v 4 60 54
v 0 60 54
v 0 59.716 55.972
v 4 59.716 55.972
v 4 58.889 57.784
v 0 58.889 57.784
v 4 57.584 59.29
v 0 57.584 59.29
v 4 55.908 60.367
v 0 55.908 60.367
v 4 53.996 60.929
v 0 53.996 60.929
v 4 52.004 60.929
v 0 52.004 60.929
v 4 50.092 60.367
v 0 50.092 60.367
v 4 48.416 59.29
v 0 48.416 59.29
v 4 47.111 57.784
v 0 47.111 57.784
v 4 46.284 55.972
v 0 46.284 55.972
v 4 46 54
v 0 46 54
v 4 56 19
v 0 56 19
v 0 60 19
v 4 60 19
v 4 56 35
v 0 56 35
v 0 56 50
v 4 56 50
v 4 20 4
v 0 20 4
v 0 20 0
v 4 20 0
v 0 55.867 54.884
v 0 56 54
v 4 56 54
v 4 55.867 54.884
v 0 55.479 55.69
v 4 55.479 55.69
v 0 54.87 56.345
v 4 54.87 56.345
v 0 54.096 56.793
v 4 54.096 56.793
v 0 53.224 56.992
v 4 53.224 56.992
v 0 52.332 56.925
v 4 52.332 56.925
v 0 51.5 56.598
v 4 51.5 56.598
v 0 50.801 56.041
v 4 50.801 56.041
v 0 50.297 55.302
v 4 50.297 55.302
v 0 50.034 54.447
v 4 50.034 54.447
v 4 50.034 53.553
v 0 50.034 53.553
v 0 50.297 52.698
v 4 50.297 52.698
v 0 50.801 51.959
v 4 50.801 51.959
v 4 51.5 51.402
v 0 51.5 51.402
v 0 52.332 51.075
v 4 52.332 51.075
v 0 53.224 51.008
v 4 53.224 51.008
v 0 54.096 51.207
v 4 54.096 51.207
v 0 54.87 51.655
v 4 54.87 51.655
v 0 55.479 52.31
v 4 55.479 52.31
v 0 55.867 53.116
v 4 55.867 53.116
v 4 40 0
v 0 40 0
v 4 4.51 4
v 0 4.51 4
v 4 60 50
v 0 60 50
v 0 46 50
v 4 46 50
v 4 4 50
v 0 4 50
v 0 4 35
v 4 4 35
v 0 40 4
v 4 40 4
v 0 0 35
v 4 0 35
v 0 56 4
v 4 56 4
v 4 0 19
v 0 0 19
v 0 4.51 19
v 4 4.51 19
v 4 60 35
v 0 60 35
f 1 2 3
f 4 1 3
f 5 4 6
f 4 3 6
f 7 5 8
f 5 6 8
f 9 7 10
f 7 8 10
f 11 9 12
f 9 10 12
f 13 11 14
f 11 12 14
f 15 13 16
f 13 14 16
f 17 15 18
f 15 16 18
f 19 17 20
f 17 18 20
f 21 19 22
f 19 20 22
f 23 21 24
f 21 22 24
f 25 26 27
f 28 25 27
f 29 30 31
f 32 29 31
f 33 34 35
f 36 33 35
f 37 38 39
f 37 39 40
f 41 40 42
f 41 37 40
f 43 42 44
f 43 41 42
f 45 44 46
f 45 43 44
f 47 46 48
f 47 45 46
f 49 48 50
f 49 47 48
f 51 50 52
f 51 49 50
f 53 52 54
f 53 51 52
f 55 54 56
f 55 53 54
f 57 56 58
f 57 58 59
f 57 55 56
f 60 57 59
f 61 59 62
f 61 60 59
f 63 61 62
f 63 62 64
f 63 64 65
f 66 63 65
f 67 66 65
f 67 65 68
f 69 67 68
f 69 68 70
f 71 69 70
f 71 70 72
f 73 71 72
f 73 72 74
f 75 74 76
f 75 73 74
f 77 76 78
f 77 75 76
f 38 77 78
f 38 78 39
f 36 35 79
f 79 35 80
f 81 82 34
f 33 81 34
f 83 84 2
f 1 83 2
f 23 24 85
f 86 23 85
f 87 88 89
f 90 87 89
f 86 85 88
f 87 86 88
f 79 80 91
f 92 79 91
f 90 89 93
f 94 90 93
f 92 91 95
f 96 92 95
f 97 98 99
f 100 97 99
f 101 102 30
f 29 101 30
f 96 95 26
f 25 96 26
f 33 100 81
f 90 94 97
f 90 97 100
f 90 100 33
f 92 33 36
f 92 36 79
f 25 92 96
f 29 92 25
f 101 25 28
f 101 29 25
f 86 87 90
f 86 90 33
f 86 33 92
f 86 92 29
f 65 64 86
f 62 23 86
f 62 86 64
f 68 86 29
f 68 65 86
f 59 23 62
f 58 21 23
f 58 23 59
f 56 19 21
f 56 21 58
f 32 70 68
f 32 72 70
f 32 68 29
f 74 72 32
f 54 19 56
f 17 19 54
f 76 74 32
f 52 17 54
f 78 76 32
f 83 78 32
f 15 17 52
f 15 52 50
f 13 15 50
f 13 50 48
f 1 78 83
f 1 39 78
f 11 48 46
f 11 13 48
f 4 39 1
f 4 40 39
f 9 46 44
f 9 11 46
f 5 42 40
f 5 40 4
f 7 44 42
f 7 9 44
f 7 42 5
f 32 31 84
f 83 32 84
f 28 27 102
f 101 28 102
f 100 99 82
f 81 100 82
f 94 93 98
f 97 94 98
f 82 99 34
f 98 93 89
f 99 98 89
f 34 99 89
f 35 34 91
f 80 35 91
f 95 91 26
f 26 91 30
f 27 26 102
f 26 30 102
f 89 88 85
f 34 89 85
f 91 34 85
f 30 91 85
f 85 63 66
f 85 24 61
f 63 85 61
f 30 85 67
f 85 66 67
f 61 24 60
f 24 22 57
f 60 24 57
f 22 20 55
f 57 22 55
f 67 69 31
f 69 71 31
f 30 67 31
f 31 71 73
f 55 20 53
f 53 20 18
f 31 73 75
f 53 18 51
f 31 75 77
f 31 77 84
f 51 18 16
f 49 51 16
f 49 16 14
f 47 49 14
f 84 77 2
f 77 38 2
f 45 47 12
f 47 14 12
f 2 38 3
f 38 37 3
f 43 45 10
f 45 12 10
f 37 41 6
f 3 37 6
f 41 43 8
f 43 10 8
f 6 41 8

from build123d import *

# Parameters (mm, degrees)
F0_R     = 3
F1_DEPTH = 4


with BuildPart() as f1:
    # F0 (on Right) → F1 (new body)
    with BuildSketch(Plane.YZ):
        with BuildLine():
            Line((20, 4), (20, 0))
            Line((20, 0), (40, 0))
            Line((40, 0), (40, 4))
            Line((40, 4), (56, 4))
            Line((56, 4), (56, 19))
            Line((56, 19), (60, 19))
            Line((60, 19), (60, 35))
            Line((60, 35), (56, 35))
            Line((56, 35), (56, 50))
            Line((56, 50), (60, 50))
            Line((60, 50), (60, 54))
            ThreePointArc((60, 54), (53, 61), (46, 54))
            Line((46, 54), (46, 50))
            Line((46, 50), (4, 50))
            Line((4, 50), (4, 35))
            Line((4, 35), (0, 35))
            Line((0, 35), (0, 19))
            Line((0, 19), (4.510439, 19))
            Line((4.510439, 19), (4.510439, 4))
            Line((4.510439, 4), (20, 4))
        make_face()
        with Locations((53, 54)):
            Circle(F0_R, mode=Mode.SUBTRACT)
    extrude(amount=F1_DEPTH)


solid = f1.part
